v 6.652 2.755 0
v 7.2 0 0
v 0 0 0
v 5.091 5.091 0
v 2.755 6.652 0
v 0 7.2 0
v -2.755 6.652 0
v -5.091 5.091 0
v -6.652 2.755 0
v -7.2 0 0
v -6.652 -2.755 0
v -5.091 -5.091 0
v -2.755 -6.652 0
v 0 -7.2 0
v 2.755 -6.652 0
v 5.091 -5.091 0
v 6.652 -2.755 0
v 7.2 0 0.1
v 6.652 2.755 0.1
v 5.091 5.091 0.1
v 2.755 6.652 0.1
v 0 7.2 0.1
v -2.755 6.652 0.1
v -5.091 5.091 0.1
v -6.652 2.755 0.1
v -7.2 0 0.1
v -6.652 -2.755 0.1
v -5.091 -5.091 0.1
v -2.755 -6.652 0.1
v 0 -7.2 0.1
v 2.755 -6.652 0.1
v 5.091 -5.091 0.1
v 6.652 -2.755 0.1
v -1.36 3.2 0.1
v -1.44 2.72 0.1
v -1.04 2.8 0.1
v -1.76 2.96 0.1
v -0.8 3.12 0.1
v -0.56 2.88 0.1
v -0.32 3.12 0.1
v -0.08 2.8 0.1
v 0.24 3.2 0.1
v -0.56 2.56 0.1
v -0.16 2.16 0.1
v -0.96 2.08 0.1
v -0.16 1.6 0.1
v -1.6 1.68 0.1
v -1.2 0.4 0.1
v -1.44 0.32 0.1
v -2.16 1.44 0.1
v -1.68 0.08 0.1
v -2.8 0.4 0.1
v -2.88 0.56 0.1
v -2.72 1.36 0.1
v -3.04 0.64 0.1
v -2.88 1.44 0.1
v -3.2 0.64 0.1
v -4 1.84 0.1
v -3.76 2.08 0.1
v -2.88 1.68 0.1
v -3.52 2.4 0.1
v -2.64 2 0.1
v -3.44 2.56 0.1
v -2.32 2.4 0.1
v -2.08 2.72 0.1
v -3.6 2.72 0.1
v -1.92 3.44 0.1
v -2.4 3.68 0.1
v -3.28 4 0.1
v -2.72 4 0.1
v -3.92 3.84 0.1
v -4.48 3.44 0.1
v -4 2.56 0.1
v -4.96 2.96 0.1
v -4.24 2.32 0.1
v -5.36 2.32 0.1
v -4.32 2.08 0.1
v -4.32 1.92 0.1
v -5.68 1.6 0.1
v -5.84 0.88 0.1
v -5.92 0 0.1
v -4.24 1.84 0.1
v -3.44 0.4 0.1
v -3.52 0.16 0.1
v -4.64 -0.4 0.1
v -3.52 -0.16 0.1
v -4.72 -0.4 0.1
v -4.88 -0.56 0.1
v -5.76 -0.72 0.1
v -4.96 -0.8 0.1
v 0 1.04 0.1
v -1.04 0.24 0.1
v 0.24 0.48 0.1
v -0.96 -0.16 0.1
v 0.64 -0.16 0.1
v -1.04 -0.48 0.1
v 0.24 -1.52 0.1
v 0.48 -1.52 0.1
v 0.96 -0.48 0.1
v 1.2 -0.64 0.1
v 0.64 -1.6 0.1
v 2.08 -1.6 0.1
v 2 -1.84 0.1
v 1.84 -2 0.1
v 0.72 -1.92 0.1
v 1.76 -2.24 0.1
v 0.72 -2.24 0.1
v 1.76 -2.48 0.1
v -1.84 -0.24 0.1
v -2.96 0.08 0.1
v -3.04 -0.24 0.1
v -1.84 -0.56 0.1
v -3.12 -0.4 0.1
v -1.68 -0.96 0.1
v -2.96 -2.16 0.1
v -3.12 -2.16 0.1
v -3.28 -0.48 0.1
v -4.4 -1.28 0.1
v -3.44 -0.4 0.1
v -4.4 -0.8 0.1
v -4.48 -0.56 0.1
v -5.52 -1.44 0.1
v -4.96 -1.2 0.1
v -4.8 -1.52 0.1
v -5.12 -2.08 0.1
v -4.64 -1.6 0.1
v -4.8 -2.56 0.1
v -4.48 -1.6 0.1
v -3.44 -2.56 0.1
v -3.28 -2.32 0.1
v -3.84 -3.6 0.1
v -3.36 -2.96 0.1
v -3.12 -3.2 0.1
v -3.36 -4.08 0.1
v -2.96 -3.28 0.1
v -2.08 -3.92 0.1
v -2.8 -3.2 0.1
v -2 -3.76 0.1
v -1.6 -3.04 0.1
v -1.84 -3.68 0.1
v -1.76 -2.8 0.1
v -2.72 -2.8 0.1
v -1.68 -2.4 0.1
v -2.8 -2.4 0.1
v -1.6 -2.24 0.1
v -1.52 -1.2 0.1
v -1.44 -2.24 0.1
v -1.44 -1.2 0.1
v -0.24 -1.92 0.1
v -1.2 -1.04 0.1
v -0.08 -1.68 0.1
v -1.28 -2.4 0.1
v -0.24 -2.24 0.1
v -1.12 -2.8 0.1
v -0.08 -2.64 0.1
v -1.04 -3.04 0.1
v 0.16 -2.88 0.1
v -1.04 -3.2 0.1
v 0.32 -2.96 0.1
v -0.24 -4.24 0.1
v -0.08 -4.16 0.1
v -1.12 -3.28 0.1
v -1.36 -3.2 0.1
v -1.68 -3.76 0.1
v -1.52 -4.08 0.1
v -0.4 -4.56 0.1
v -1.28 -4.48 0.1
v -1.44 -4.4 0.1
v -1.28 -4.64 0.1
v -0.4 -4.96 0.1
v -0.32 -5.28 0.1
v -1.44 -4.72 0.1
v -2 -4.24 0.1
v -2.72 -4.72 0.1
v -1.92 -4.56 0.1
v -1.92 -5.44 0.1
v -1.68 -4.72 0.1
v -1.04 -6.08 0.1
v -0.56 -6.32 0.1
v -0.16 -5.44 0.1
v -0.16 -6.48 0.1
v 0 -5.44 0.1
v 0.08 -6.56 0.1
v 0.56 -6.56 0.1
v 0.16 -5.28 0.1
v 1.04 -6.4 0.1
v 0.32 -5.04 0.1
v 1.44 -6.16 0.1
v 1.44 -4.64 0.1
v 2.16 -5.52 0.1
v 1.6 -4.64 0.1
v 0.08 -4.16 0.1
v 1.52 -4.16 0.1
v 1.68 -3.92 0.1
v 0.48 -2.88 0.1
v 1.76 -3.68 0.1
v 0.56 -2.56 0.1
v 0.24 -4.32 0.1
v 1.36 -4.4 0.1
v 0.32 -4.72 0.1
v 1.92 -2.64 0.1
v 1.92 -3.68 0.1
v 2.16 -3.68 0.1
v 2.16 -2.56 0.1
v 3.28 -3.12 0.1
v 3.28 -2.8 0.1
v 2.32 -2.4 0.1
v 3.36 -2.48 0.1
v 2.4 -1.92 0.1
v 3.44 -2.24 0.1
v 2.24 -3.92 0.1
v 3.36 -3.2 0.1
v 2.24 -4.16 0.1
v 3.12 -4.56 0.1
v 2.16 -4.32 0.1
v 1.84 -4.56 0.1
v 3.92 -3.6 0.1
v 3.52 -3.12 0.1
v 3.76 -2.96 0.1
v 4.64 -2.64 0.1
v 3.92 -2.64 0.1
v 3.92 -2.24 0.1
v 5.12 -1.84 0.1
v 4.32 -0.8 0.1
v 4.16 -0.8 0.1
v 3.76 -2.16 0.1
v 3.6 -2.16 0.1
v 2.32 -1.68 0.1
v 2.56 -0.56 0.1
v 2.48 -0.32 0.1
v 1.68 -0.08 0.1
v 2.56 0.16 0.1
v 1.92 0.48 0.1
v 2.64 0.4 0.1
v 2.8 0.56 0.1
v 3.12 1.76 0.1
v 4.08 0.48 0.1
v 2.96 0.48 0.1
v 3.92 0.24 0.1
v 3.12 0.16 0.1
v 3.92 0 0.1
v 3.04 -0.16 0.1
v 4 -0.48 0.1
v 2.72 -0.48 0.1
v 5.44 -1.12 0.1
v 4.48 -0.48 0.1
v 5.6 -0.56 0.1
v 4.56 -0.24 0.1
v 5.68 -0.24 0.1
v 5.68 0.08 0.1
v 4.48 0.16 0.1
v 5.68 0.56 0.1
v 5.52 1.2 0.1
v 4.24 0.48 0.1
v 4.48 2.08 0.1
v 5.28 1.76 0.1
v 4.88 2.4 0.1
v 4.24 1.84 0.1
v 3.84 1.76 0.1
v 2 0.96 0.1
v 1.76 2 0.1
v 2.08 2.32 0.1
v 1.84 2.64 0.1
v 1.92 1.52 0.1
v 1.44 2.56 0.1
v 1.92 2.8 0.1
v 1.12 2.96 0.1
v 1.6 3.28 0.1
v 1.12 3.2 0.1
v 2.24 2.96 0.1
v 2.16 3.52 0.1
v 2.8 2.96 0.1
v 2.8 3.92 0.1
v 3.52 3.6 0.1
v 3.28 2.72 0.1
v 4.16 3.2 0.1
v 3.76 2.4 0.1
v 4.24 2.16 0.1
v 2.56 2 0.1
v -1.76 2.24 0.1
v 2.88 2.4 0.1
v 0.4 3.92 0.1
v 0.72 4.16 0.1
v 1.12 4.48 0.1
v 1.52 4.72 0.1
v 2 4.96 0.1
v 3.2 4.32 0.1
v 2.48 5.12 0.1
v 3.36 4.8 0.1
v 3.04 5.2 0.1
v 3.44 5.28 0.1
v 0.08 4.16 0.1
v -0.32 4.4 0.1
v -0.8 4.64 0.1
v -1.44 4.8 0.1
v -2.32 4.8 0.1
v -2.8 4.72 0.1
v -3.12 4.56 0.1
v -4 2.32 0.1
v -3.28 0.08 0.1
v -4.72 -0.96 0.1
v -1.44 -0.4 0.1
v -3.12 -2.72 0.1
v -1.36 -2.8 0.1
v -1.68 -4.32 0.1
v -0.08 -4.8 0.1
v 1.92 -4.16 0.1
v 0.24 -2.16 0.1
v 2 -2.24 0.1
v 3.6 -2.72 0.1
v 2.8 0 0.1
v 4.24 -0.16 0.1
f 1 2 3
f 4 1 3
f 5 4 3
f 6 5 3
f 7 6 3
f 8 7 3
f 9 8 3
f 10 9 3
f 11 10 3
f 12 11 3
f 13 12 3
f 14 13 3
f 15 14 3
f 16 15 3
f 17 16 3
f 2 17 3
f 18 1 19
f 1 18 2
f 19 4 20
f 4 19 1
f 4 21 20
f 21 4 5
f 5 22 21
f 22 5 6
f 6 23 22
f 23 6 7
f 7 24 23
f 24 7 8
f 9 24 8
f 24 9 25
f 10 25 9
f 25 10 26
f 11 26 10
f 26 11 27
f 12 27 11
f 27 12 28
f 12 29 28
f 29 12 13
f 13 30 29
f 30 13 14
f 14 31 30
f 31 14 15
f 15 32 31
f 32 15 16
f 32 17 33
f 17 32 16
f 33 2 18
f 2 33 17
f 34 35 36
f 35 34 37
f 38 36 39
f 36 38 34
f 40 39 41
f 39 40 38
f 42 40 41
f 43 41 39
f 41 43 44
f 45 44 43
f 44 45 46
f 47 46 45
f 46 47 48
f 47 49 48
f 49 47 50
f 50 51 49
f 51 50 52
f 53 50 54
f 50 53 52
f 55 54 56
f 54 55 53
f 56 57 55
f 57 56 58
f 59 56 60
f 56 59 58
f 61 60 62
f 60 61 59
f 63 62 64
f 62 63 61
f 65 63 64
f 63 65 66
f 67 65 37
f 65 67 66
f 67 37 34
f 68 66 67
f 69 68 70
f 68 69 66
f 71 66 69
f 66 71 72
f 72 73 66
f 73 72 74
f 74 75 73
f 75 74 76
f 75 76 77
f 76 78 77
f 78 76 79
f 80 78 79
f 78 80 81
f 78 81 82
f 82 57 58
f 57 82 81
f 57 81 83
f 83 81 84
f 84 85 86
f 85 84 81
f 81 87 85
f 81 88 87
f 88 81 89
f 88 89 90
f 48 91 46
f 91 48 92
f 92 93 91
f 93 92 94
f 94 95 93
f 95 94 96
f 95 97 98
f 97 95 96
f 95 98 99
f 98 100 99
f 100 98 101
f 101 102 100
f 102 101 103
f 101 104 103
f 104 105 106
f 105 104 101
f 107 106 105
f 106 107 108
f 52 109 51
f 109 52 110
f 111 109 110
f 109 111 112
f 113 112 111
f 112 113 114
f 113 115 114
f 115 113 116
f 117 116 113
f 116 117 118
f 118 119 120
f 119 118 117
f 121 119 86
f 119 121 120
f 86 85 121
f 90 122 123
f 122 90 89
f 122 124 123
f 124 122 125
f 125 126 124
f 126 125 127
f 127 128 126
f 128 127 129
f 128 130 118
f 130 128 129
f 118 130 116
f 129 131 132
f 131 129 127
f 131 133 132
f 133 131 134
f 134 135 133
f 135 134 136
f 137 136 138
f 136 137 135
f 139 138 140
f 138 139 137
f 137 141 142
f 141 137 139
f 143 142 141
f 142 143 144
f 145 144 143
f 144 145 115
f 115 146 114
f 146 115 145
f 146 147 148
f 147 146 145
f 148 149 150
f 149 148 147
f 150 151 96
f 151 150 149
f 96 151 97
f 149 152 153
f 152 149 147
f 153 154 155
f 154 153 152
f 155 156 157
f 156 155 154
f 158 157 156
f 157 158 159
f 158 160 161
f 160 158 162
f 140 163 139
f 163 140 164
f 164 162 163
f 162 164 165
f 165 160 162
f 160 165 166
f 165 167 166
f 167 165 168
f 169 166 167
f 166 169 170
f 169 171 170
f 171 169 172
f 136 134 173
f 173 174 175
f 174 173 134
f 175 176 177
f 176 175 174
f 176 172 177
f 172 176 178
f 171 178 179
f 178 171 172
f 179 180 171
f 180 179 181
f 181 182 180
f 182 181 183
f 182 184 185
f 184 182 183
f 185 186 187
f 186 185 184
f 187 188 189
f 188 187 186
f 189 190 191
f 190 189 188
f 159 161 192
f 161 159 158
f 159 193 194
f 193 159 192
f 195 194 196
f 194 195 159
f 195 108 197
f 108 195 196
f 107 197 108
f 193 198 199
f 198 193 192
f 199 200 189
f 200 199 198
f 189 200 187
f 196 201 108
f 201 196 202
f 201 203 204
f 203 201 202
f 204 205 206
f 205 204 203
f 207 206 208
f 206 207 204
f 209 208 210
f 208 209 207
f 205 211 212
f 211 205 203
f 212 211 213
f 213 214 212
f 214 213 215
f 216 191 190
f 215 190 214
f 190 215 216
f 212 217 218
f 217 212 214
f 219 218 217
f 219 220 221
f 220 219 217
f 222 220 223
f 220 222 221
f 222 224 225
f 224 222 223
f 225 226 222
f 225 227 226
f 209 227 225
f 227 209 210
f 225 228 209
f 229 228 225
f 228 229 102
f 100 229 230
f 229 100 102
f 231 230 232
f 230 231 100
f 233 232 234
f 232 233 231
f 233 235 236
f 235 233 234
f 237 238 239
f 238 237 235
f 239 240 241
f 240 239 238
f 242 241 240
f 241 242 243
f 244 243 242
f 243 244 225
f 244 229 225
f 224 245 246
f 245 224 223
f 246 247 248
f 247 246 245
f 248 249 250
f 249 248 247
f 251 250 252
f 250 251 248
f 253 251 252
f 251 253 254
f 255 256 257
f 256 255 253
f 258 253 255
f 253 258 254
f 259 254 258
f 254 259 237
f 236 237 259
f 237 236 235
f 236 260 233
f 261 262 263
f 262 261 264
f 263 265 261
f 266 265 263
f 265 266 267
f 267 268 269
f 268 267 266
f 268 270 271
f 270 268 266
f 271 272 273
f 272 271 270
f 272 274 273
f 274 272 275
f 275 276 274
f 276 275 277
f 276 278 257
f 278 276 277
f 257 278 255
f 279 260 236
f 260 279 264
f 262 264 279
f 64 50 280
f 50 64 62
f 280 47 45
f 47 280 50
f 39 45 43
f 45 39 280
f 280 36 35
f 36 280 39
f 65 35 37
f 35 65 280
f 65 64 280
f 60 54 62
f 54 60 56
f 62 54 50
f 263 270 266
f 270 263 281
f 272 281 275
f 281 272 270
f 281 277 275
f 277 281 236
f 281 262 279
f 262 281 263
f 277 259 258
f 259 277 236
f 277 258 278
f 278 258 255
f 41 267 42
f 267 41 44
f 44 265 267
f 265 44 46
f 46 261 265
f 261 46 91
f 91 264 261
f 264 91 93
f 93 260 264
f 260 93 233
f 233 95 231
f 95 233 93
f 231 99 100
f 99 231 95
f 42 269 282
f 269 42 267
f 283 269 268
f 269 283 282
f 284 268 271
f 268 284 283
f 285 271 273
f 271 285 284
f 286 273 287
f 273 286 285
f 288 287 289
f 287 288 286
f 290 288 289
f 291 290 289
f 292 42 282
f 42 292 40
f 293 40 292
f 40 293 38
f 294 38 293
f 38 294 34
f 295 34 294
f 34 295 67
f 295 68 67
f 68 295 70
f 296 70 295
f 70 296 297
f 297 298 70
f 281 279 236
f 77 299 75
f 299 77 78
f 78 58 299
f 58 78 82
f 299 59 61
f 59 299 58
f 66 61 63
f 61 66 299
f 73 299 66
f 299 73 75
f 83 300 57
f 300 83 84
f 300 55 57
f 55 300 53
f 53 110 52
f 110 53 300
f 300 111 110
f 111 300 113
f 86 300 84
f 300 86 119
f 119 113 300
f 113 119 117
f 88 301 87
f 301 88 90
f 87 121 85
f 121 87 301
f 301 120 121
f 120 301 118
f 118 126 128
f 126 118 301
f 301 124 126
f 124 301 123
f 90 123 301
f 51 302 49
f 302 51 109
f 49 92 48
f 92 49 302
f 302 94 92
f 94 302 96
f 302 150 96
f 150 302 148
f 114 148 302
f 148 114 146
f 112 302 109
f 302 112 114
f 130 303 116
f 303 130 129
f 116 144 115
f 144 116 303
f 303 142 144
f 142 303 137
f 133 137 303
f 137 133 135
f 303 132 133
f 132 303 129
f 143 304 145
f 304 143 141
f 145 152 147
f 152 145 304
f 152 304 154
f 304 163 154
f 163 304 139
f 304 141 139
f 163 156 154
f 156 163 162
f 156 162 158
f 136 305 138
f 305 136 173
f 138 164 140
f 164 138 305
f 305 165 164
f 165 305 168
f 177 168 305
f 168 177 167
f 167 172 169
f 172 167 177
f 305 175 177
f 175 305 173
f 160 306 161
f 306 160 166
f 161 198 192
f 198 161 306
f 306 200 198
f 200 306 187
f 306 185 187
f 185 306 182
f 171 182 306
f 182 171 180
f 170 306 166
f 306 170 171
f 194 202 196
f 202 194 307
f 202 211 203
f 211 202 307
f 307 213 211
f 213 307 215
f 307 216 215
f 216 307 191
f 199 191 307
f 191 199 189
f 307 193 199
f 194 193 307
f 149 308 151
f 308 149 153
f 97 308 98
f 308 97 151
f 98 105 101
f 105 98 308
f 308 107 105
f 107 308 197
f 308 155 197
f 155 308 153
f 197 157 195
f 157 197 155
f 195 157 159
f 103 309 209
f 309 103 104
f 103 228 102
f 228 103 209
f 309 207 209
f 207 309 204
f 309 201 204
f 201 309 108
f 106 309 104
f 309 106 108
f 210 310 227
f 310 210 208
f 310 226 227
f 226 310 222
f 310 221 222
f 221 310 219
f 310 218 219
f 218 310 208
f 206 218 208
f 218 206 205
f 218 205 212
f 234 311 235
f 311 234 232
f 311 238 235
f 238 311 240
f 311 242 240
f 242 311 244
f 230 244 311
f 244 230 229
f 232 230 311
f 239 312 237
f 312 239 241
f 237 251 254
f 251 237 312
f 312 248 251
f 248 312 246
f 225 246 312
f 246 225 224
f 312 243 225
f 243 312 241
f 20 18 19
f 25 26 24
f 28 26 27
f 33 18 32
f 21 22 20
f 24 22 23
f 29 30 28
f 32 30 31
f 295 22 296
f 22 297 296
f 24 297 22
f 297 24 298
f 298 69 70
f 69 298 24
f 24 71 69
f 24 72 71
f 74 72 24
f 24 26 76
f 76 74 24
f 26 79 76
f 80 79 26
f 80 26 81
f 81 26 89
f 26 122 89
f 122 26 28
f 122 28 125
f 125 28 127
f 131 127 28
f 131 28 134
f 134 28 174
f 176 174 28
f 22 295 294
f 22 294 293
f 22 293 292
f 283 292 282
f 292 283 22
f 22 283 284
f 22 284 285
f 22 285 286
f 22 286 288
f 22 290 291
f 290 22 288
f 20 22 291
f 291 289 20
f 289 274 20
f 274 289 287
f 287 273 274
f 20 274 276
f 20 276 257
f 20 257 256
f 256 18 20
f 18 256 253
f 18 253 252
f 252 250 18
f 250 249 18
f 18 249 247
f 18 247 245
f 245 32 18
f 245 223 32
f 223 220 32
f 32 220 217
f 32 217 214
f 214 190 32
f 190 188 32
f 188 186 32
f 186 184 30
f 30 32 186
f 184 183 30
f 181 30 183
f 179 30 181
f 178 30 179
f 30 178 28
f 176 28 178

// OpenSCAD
use <../lib.scad>
use <../p/4-4cylc3.scad>
use <s/98138p0js01.scad>
use <s/98138p0js02.scad>
use <s/98138p0js03.scad>
use <s/98138p0js04.scad>
function ldraw_lib__6057849d() = [
// 0 Sticker  1.8 x  1.8 Round with Strawberry on Bright Pink Background
// 0 Name: 6057849d.dat
// 0 Author: Takeshi Takahashi [RainbowDolphin]
// 0 !LDRAW_ORG Part UPDATE 2026-04
// 0 !LICENSE Licensed under CC BY 4.0 : see CAreadme.txt
// 
// 0 BFC CERTIFY CCW
  [0,"BFC","CERTIFY"],
  [0,"BFC","CCW"],
// 
// 0 !KEYWORDS BrickLink 41035stk01a, Brickowl 599615, Cafe, Heartlake juice bar
// 0 !KEYWORDS Rebrickable 16264, Set 41035, Signboard
// 
// 0 !HISTORY 2026-04-27 [OrionP] Official Update 2026-04
// 
// 1 16 0 0 0 18 0 0 0 -0.25 0 0 0 18 4-4cylc3.dat
  [1,16,0,0,0,18,0,0,0,-0.25,0,0,0,18, ldraw_lib__4_4cylc3()],
// 1 5 0 -.25 0 2 0 0 0 1 0 0 0 2 s\98138p0js01.dat
  [1,5,0,-.25,0,2,0,0,0,1,0,0,0,2, ldraw_lib__s__98138p0js01()],
// 1 27 0 -.25 0 2 0 0 0 1 0 0 0 2 s\98138p0js02.dat
  [1,27,0,-.25,0,2,0,0,0,1,0,0,0,2, ldraw_lib__s__98138p0js02()],
// 1 15 0 -.25 0 2 0 0 0 1 0 0 0 2 s\98138p0js03.dat
  [1,15,0,-.25,0,2,0,0,0,1,0,0,0,2, ldraw_lib__s__98138p0js03()],
// 1 29 0 -.25 0 2 0 0 0 1 0 0 0 2 s\98138p0js04.dat
  [1,29,0,-.25,0,2,0,0,0,1,0,0,0,2, ldraw_lib__s__98138p0js04()],
];
module ldraw_lib__6057849d(step=0, col=false, unit=2/5, alt=false, line=0.2, solid=!$preview)
    makepoly(ldraw_lib__6057849d(), step=step, col=col, unit=unit, alt=alt, line=line, solid=solid);
ldraw_lib__6057849d(line=0.2);
